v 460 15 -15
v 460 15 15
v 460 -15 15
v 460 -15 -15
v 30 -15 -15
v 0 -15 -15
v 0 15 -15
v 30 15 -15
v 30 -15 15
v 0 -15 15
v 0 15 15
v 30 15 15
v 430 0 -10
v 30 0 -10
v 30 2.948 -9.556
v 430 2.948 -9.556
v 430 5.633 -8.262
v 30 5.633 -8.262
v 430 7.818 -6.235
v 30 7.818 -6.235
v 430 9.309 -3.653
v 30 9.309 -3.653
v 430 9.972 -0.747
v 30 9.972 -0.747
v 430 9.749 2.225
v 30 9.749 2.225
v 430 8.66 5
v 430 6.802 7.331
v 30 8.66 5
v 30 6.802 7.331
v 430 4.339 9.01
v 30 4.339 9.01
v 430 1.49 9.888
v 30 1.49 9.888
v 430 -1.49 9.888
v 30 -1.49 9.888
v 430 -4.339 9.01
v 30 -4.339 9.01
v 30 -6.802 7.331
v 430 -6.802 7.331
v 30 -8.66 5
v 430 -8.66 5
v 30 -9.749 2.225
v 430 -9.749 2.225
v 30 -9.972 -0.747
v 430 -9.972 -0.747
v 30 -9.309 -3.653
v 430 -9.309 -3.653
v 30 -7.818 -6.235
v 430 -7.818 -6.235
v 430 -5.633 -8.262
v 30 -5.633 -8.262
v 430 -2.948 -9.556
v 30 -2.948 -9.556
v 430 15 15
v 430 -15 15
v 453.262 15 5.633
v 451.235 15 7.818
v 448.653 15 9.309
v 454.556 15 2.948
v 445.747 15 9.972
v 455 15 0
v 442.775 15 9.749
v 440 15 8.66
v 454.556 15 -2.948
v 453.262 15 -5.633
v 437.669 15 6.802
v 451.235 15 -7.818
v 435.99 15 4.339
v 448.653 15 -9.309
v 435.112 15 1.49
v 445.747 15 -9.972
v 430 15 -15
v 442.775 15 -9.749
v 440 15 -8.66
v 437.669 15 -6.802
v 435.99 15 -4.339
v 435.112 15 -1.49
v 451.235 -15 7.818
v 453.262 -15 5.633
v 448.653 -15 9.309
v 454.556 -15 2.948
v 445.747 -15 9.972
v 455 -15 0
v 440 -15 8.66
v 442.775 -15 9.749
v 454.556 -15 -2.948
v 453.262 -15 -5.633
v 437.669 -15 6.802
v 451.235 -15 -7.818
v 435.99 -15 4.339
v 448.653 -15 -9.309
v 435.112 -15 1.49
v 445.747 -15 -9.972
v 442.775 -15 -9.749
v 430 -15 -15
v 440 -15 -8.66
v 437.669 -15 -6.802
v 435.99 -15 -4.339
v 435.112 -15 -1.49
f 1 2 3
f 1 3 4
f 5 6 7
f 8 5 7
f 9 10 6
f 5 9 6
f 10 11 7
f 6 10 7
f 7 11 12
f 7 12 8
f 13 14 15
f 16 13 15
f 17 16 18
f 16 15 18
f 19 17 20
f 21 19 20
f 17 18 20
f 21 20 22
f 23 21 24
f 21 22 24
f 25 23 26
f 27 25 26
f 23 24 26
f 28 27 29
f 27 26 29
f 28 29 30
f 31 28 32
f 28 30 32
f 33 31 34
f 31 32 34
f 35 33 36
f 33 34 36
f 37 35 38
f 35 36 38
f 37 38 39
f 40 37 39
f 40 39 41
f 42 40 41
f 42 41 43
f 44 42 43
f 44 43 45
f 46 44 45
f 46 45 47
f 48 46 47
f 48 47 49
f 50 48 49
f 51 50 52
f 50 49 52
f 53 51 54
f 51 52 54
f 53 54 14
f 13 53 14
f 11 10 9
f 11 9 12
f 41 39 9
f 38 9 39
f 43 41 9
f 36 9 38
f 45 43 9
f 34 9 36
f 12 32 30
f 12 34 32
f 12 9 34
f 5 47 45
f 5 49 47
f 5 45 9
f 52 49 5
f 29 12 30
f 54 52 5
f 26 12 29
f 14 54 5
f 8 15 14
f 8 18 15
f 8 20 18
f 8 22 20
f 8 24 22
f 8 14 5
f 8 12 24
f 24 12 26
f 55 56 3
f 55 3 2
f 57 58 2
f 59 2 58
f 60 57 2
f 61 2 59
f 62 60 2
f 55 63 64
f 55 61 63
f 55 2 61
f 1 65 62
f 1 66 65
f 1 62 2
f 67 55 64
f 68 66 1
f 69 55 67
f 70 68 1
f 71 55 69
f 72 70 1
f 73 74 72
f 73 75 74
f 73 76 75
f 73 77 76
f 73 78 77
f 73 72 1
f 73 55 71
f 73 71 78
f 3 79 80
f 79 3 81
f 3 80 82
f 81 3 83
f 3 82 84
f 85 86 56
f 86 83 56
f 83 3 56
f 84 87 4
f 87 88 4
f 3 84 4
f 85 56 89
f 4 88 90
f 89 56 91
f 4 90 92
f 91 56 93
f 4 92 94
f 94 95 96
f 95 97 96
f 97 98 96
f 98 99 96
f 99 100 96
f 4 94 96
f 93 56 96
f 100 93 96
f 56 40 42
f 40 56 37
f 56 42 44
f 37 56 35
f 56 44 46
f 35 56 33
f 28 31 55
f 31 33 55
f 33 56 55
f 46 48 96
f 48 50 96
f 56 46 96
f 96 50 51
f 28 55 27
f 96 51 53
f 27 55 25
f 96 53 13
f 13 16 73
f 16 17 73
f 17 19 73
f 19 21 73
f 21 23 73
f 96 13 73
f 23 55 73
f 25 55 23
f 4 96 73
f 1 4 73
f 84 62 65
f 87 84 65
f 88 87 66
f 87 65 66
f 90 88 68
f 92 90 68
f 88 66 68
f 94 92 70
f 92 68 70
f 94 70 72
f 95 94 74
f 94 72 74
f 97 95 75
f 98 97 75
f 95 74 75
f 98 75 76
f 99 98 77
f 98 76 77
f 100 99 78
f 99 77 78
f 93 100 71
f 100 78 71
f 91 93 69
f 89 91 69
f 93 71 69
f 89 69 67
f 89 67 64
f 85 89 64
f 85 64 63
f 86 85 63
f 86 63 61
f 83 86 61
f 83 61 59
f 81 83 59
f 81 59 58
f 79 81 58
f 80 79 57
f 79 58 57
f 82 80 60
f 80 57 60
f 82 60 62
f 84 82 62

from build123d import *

# Parameters (mm, degrees)
SKETCH1_W           = 30
SKETCH1_H           = 30
BOSS_EXTRUDE1_DEPTH = 30
SKETCH2_R           = 10
BOSS_EXTRUDE2_DEPTH = 400
SKETCH3_W           = 30
SKETCH3_H           = 30
BOSS_EXTRUDE3_DEPTH = 30
SKETCH4_R           = 10
CUT_EXTRUDE1_DEPTH  = 30


with BuildPart() as part:
    # Sketch1 → Boss-Extrude1 (new body)
    with BuildSketch(Plane(origin=(0, 0, 0), x_dir=(0, 0, -1), z_dir=(1, 0, 0))):
        Rectangle(SKETCH1_W, SKETCH1_H)
    extrude(amount=BOSS_EXTRUDE1_DEPTH)

    # Sketch2 → Boss-Extrude2 (add)
    with BuildSketch(Plane(origin=(30, 0, 0), x_dir=(0, 0, -1), z_dir=(1, 0, 0))):
        Circle(SKETCH2_R)
    extrude(amount=BOSS_EXTRUDE2_DEPTH)

    # Sketch3 → Boss-Extrude3 (add)
    with BuildSketch(Plane(origin=(430, 0, 0), x_dir=(0, 0, -1), z_dir=(1, 0, 0))):
        Rectangle(SKETCH3_W, SKETCH3_H)
    extrude(amount=BOSS_EXTRUDE3_DEPTH)

    # Sketch4 → Cut-Extrude1 (cut)
    with BuildSketch(Plane(origin=(0, 15, 0), x_dir=(1, 0, 0), z_dir=(0, 1, 0))):
        with Locations((445, 0)):
            Circle(SKETCH4_R)
    extrude(amount=-CUT_EXTRUDE1_DEPTH, mode=Mode.SUBTRACT)


solid = part.part
